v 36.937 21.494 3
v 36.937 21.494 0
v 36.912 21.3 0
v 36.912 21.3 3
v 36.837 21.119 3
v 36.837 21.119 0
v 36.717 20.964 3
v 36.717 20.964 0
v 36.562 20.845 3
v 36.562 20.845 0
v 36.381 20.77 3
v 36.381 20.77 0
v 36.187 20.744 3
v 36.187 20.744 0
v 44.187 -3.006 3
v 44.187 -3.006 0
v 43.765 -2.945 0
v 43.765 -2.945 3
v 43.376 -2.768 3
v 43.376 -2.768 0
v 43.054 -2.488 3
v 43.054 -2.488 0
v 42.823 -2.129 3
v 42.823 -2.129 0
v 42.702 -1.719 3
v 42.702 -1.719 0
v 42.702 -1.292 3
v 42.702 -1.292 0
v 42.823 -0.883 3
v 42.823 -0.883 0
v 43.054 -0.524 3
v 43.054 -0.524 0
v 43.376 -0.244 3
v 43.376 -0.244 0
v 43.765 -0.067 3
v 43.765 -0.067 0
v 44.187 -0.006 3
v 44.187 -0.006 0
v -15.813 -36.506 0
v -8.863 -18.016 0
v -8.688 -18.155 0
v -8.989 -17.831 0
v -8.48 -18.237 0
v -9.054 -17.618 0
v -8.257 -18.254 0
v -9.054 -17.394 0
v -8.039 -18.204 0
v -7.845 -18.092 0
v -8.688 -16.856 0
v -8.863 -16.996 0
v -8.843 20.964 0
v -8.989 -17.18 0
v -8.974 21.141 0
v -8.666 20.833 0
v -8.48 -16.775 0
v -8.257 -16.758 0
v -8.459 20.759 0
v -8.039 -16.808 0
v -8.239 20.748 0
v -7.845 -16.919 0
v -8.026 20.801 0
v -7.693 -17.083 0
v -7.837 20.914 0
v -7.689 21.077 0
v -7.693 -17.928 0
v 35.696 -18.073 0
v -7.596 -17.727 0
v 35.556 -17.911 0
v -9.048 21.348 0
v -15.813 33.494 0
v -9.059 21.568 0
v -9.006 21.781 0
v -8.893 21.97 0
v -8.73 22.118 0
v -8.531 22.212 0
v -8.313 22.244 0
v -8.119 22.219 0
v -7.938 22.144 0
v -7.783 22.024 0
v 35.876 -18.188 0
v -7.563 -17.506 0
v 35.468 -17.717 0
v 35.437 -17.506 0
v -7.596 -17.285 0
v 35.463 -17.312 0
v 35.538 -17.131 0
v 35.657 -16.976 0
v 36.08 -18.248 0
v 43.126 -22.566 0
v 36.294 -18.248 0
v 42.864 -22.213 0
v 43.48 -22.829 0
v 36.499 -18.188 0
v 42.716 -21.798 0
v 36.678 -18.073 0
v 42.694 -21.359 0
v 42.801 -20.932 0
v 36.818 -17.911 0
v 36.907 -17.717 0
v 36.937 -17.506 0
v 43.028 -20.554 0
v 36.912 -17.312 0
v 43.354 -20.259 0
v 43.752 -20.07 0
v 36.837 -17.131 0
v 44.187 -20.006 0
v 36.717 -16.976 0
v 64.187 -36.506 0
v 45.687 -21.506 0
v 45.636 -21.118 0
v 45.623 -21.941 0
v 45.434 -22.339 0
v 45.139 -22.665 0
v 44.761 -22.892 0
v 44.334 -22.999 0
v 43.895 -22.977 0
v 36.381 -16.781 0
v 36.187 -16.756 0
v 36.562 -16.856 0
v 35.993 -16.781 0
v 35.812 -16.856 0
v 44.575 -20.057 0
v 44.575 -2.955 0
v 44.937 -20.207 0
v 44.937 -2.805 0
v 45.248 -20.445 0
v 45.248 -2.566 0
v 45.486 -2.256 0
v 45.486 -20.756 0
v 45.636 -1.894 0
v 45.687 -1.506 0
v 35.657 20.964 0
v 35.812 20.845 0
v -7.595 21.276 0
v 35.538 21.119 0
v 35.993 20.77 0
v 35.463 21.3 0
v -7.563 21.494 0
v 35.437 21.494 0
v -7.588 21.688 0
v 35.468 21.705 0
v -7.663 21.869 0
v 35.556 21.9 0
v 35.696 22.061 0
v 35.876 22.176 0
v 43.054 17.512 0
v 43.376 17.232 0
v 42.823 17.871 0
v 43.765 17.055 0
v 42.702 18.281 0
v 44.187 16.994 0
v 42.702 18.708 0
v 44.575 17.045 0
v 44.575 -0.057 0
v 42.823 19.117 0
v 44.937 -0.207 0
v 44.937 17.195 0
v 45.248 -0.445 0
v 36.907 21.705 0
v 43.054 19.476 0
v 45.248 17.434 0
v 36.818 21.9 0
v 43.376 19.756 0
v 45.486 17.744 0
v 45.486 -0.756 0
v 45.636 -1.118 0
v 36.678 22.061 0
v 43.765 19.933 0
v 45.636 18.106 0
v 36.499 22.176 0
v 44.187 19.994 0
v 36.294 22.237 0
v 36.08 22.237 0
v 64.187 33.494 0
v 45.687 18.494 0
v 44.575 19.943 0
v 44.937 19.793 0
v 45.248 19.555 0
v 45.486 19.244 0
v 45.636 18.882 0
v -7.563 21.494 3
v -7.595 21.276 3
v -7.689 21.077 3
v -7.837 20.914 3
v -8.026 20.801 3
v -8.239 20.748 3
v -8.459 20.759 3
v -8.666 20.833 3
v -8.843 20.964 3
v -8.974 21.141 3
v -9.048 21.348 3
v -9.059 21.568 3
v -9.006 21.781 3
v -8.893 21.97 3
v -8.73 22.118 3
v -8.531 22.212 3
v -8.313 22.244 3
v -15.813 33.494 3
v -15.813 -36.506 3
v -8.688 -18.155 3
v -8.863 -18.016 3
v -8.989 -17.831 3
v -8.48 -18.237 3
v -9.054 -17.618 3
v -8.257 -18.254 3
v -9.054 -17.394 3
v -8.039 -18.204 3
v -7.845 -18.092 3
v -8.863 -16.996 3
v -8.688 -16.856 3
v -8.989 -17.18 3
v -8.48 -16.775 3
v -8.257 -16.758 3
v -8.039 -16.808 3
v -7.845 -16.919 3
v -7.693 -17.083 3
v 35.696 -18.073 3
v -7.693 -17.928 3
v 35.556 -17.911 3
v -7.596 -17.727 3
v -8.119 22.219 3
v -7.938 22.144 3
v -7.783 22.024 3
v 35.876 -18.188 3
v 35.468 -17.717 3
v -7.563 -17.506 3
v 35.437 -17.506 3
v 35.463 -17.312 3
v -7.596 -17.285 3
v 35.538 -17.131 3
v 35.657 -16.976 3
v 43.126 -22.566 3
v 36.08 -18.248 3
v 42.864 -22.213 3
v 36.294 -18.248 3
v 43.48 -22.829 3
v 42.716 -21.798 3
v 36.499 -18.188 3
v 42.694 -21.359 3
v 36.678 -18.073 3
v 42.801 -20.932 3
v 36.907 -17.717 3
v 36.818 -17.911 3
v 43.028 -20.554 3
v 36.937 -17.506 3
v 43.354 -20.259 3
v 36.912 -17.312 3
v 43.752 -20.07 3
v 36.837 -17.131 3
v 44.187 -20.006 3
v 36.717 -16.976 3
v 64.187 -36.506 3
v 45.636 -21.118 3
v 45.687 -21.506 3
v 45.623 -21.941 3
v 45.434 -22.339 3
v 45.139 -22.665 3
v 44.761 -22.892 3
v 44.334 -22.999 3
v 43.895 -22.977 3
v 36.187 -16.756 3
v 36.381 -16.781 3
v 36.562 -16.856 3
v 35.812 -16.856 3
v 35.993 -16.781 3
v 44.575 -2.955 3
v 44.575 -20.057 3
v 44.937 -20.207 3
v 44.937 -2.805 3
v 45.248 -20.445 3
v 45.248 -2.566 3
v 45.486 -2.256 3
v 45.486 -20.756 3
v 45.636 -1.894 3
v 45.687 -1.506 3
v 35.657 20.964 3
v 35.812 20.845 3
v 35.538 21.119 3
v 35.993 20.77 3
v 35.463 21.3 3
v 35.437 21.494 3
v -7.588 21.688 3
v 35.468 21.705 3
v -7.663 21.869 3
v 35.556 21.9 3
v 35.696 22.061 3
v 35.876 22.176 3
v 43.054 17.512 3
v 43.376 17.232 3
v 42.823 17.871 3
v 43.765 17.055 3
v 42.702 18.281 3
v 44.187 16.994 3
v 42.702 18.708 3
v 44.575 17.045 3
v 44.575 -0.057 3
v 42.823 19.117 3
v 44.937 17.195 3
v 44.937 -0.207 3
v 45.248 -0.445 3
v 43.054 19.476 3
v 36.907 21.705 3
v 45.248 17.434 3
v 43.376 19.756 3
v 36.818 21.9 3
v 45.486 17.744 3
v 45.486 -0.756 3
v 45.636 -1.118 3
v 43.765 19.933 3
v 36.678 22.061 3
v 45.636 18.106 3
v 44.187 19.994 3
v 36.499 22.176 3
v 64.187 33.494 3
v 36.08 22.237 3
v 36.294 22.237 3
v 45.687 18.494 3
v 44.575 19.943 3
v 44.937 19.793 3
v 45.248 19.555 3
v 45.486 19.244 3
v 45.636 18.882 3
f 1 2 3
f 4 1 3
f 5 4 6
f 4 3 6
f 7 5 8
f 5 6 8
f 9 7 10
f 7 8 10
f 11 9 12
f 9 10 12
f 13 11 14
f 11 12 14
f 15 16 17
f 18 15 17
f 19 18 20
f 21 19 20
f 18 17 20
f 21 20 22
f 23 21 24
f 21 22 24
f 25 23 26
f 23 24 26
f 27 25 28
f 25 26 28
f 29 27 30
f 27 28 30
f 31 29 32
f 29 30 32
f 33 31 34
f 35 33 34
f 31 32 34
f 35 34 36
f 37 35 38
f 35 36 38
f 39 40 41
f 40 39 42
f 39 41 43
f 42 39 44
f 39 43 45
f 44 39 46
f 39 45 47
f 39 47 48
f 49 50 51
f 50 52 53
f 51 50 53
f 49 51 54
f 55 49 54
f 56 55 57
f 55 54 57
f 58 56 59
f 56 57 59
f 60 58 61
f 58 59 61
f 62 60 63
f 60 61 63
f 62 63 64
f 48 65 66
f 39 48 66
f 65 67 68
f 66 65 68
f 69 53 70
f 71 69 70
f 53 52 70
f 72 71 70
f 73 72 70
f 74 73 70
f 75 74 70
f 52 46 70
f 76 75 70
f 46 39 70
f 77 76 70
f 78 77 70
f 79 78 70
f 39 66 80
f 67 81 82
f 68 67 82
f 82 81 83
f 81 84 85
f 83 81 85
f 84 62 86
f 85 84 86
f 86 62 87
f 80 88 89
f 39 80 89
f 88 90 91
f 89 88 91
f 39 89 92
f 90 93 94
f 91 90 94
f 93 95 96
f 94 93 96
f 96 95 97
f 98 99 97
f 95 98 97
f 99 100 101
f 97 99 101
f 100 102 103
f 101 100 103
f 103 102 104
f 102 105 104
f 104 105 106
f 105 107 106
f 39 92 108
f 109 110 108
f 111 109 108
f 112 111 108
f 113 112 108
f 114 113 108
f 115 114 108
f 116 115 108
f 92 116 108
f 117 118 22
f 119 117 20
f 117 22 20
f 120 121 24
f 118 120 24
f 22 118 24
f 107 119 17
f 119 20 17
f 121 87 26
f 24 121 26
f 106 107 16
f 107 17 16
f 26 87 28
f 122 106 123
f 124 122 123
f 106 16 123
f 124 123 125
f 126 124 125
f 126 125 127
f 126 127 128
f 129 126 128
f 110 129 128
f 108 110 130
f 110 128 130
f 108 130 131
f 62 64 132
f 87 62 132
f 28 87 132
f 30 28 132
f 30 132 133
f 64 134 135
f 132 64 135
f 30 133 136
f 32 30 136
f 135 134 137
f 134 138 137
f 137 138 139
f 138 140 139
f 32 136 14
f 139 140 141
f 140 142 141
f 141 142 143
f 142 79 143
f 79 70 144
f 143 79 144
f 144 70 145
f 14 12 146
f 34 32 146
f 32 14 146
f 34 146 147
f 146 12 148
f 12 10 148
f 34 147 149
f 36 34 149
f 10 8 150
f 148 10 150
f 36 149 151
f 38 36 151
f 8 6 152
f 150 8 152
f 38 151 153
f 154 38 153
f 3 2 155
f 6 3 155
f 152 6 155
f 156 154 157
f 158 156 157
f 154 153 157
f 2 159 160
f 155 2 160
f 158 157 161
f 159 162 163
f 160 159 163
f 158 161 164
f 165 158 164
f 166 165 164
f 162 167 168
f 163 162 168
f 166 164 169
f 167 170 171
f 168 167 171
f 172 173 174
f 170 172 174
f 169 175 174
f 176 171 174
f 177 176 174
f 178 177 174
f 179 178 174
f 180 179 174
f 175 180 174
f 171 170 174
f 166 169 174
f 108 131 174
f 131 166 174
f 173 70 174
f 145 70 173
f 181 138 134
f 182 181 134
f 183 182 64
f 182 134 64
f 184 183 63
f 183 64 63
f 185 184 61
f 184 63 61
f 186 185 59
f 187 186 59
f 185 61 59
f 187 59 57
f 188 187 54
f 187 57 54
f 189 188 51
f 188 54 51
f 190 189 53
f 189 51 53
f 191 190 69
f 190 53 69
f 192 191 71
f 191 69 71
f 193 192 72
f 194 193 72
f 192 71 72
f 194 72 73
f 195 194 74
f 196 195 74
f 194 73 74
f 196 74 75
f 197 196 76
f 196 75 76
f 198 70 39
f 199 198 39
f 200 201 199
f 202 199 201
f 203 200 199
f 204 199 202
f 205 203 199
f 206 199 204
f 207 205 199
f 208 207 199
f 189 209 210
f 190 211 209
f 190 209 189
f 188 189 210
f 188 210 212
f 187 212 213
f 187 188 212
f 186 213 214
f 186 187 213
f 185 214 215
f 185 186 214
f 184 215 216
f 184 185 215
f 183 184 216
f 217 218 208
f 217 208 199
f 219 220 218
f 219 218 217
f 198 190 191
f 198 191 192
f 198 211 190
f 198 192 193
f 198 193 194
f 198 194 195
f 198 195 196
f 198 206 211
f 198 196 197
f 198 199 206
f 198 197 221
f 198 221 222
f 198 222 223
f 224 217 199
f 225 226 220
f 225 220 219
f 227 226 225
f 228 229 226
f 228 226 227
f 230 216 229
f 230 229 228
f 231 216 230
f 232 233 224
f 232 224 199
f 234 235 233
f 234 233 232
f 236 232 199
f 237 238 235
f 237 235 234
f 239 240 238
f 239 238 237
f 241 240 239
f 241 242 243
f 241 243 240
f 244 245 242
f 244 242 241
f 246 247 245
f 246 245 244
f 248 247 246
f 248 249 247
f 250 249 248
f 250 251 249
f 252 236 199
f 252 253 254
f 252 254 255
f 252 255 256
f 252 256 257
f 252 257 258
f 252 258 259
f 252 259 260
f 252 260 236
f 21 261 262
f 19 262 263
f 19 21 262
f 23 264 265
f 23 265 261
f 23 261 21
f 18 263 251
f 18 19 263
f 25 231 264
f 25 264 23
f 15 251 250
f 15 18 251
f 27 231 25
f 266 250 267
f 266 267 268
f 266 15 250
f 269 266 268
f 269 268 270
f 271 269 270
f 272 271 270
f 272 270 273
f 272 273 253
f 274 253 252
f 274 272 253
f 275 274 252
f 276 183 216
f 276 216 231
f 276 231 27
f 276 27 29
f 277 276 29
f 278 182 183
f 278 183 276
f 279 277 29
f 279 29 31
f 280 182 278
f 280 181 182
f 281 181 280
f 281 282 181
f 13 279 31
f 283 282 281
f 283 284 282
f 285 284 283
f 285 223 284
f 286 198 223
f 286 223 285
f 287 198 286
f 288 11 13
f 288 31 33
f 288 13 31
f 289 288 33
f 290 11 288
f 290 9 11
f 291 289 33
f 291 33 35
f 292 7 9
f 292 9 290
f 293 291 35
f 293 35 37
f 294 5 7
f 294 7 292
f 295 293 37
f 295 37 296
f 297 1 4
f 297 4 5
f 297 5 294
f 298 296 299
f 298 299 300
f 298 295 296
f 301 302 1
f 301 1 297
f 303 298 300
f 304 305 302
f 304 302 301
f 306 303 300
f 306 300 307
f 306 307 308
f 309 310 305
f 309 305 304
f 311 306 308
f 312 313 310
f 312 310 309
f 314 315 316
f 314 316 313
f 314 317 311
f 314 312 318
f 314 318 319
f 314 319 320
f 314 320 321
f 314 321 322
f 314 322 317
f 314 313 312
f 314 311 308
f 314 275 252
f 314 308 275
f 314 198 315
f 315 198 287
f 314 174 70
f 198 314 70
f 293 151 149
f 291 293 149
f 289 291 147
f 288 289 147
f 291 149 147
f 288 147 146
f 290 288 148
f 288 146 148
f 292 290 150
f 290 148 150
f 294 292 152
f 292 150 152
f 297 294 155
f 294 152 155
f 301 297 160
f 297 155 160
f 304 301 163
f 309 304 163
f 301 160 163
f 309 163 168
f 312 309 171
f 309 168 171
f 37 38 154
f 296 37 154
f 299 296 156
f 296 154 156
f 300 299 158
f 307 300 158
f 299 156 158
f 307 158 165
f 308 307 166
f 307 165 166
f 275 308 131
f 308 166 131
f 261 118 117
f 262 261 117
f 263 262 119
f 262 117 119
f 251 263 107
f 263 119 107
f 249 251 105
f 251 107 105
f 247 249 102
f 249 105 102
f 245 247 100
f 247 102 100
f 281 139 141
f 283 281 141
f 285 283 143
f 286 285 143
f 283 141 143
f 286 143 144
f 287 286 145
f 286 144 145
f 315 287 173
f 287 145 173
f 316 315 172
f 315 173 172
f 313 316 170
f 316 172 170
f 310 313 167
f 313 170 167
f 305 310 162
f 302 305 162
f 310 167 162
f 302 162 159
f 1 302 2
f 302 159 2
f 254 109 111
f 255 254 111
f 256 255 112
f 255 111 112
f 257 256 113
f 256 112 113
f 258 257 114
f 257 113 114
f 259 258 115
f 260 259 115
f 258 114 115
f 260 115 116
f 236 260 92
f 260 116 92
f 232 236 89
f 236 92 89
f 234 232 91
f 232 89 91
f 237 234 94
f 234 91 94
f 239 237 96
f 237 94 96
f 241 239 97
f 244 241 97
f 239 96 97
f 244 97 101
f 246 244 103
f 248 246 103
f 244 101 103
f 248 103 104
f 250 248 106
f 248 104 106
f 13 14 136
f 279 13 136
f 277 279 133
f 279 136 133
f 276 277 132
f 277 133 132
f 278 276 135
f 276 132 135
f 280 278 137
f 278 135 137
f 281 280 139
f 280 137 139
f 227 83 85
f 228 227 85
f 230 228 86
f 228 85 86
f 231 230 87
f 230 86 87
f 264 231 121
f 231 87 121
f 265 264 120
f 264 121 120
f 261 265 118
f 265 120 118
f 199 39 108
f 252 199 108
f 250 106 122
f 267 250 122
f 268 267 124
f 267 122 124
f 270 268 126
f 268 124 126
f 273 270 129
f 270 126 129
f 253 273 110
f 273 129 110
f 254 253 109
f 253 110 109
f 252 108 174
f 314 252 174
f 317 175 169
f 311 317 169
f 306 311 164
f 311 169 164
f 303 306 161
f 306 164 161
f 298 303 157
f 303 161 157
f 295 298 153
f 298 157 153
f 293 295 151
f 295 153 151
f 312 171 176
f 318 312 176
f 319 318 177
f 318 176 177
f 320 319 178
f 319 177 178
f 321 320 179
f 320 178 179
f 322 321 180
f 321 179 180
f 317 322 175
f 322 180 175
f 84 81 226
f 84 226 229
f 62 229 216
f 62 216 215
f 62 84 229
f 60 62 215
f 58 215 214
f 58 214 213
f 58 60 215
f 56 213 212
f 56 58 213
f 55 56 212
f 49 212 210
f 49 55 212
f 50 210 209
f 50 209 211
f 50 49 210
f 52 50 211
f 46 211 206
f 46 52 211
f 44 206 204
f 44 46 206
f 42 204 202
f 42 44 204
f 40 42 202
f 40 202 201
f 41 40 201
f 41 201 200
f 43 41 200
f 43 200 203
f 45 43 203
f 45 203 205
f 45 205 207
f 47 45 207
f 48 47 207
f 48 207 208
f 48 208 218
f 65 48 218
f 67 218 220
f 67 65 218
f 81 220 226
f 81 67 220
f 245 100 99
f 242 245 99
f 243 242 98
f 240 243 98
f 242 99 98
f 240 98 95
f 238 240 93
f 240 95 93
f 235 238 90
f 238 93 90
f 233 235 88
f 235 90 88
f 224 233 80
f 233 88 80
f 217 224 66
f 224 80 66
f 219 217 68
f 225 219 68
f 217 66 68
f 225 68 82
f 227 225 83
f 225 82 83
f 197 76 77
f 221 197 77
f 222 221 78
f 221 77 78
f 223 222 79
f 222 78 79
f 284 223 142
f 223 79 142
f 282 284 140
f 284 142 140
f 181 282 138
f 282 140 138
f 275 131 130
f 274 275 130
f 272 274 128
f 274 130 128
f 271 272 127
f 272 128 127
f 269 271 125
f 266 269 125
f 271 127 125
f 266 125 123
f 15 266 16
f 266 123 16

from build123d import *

# Parameters (mm, degrees)
F0_R     = 0.75
F1_DEPTH = 3


with BuildPart() as f1:
    # F0 (on Top) → F1 (new body)
    with BuildSketch(Plane.XY):
        Polygon((-10.812854, 33.494167), (-15.812854, 33.494167), (-15.812854, -36.505833), (64.187146, -36.505833), (64.187146, 33.494167), (44.187146, 33.494167), (-6.812854, 33.494167), (-8.312854, 33.494167), align=None)
        with Locations((-8.312854, -17.505833)):
            Circle(F0_R, mode=Mode.SUBTRACT)
        with BuildLine():
            ThreePointArc((45.687146, -21.505833), (43.126486, -22.566493), (44.187146, -20.005833))
            ThreePointArc((44.187146, -20.005833), (45.247806, -20.445173), (45.687146, -21.505833))
        make_face(mode=Mode.SUBTRACT)
        with BuildLine():
            ThreePointArc((35.437146, -17.505833), (35.656816, -16.975503), (36.187146, -16.755833))
            ThreePointArc((36.187146, -16.755833), (36.717476, -16.975503), (36.937146, -17.505833))
            ThreePointArc((36.937146, -17.505833), (36.187146, -18.255833), (35.437146, -17.505833))
        make_face(mode=Mode.SUBTRACT)
        with BuildLine():
            ThreePointArc((-7.562854, 21.494167), (-8.843184, 20.963837), (-8.312854, 22.244167))
            ThreePointArc((-8.312854, 22.244167), (-7.782524, 22.024497), (-7.562854, 21.494167))
        make_face(mode=Mode.SUBTRACT)
        with BuildLine():
            ThreePointArc((44.187146, -3.005833), (42.687146, -1.505833), (44.187146, -0.005833))
            ThreePointArc((44.187146, -0.005833), (45.247806, -0.445173), (45.687146, -1.505833))
            ThreePointArc((45.687146, -1.505833), (45.247806, -2.566493), (44.187146, -3.005833))
        make_face(mode=Mode.SUBTRACT)
        with BuildLine():
            ThreePointArc((36.187146, 20.744167), (35.656816, 20.963837), (35.437146, 21.494167))
            ThreePointArc((35.437146, 21.494167), (36.187146, 22.244167), (36.937146, 21.494167))
            ThreePointArc((36.937146, 21.494167), (36.717476, 20.963837), (36.187146, 20.744167))
        make_face(mode=Mode.SUBTRACT)
        with BuildLine():
            ThreePointArc((44.187146, 16.994167), (42.687146, 18.494167), (44.187146, 19.994167))
            ThreePointArc((44.187146, 19.994167), (45.247806, 19.554827), (45.687146, 18.494167))
            ThreePointArc((45.687146, 18.494167), (45.247806, 17.433507), (44.187146, 16.994167))
        make_face(mode=Mode.SUBTRACT)
    extrude(amount=F1_DEPTH)


solid = f1.part
